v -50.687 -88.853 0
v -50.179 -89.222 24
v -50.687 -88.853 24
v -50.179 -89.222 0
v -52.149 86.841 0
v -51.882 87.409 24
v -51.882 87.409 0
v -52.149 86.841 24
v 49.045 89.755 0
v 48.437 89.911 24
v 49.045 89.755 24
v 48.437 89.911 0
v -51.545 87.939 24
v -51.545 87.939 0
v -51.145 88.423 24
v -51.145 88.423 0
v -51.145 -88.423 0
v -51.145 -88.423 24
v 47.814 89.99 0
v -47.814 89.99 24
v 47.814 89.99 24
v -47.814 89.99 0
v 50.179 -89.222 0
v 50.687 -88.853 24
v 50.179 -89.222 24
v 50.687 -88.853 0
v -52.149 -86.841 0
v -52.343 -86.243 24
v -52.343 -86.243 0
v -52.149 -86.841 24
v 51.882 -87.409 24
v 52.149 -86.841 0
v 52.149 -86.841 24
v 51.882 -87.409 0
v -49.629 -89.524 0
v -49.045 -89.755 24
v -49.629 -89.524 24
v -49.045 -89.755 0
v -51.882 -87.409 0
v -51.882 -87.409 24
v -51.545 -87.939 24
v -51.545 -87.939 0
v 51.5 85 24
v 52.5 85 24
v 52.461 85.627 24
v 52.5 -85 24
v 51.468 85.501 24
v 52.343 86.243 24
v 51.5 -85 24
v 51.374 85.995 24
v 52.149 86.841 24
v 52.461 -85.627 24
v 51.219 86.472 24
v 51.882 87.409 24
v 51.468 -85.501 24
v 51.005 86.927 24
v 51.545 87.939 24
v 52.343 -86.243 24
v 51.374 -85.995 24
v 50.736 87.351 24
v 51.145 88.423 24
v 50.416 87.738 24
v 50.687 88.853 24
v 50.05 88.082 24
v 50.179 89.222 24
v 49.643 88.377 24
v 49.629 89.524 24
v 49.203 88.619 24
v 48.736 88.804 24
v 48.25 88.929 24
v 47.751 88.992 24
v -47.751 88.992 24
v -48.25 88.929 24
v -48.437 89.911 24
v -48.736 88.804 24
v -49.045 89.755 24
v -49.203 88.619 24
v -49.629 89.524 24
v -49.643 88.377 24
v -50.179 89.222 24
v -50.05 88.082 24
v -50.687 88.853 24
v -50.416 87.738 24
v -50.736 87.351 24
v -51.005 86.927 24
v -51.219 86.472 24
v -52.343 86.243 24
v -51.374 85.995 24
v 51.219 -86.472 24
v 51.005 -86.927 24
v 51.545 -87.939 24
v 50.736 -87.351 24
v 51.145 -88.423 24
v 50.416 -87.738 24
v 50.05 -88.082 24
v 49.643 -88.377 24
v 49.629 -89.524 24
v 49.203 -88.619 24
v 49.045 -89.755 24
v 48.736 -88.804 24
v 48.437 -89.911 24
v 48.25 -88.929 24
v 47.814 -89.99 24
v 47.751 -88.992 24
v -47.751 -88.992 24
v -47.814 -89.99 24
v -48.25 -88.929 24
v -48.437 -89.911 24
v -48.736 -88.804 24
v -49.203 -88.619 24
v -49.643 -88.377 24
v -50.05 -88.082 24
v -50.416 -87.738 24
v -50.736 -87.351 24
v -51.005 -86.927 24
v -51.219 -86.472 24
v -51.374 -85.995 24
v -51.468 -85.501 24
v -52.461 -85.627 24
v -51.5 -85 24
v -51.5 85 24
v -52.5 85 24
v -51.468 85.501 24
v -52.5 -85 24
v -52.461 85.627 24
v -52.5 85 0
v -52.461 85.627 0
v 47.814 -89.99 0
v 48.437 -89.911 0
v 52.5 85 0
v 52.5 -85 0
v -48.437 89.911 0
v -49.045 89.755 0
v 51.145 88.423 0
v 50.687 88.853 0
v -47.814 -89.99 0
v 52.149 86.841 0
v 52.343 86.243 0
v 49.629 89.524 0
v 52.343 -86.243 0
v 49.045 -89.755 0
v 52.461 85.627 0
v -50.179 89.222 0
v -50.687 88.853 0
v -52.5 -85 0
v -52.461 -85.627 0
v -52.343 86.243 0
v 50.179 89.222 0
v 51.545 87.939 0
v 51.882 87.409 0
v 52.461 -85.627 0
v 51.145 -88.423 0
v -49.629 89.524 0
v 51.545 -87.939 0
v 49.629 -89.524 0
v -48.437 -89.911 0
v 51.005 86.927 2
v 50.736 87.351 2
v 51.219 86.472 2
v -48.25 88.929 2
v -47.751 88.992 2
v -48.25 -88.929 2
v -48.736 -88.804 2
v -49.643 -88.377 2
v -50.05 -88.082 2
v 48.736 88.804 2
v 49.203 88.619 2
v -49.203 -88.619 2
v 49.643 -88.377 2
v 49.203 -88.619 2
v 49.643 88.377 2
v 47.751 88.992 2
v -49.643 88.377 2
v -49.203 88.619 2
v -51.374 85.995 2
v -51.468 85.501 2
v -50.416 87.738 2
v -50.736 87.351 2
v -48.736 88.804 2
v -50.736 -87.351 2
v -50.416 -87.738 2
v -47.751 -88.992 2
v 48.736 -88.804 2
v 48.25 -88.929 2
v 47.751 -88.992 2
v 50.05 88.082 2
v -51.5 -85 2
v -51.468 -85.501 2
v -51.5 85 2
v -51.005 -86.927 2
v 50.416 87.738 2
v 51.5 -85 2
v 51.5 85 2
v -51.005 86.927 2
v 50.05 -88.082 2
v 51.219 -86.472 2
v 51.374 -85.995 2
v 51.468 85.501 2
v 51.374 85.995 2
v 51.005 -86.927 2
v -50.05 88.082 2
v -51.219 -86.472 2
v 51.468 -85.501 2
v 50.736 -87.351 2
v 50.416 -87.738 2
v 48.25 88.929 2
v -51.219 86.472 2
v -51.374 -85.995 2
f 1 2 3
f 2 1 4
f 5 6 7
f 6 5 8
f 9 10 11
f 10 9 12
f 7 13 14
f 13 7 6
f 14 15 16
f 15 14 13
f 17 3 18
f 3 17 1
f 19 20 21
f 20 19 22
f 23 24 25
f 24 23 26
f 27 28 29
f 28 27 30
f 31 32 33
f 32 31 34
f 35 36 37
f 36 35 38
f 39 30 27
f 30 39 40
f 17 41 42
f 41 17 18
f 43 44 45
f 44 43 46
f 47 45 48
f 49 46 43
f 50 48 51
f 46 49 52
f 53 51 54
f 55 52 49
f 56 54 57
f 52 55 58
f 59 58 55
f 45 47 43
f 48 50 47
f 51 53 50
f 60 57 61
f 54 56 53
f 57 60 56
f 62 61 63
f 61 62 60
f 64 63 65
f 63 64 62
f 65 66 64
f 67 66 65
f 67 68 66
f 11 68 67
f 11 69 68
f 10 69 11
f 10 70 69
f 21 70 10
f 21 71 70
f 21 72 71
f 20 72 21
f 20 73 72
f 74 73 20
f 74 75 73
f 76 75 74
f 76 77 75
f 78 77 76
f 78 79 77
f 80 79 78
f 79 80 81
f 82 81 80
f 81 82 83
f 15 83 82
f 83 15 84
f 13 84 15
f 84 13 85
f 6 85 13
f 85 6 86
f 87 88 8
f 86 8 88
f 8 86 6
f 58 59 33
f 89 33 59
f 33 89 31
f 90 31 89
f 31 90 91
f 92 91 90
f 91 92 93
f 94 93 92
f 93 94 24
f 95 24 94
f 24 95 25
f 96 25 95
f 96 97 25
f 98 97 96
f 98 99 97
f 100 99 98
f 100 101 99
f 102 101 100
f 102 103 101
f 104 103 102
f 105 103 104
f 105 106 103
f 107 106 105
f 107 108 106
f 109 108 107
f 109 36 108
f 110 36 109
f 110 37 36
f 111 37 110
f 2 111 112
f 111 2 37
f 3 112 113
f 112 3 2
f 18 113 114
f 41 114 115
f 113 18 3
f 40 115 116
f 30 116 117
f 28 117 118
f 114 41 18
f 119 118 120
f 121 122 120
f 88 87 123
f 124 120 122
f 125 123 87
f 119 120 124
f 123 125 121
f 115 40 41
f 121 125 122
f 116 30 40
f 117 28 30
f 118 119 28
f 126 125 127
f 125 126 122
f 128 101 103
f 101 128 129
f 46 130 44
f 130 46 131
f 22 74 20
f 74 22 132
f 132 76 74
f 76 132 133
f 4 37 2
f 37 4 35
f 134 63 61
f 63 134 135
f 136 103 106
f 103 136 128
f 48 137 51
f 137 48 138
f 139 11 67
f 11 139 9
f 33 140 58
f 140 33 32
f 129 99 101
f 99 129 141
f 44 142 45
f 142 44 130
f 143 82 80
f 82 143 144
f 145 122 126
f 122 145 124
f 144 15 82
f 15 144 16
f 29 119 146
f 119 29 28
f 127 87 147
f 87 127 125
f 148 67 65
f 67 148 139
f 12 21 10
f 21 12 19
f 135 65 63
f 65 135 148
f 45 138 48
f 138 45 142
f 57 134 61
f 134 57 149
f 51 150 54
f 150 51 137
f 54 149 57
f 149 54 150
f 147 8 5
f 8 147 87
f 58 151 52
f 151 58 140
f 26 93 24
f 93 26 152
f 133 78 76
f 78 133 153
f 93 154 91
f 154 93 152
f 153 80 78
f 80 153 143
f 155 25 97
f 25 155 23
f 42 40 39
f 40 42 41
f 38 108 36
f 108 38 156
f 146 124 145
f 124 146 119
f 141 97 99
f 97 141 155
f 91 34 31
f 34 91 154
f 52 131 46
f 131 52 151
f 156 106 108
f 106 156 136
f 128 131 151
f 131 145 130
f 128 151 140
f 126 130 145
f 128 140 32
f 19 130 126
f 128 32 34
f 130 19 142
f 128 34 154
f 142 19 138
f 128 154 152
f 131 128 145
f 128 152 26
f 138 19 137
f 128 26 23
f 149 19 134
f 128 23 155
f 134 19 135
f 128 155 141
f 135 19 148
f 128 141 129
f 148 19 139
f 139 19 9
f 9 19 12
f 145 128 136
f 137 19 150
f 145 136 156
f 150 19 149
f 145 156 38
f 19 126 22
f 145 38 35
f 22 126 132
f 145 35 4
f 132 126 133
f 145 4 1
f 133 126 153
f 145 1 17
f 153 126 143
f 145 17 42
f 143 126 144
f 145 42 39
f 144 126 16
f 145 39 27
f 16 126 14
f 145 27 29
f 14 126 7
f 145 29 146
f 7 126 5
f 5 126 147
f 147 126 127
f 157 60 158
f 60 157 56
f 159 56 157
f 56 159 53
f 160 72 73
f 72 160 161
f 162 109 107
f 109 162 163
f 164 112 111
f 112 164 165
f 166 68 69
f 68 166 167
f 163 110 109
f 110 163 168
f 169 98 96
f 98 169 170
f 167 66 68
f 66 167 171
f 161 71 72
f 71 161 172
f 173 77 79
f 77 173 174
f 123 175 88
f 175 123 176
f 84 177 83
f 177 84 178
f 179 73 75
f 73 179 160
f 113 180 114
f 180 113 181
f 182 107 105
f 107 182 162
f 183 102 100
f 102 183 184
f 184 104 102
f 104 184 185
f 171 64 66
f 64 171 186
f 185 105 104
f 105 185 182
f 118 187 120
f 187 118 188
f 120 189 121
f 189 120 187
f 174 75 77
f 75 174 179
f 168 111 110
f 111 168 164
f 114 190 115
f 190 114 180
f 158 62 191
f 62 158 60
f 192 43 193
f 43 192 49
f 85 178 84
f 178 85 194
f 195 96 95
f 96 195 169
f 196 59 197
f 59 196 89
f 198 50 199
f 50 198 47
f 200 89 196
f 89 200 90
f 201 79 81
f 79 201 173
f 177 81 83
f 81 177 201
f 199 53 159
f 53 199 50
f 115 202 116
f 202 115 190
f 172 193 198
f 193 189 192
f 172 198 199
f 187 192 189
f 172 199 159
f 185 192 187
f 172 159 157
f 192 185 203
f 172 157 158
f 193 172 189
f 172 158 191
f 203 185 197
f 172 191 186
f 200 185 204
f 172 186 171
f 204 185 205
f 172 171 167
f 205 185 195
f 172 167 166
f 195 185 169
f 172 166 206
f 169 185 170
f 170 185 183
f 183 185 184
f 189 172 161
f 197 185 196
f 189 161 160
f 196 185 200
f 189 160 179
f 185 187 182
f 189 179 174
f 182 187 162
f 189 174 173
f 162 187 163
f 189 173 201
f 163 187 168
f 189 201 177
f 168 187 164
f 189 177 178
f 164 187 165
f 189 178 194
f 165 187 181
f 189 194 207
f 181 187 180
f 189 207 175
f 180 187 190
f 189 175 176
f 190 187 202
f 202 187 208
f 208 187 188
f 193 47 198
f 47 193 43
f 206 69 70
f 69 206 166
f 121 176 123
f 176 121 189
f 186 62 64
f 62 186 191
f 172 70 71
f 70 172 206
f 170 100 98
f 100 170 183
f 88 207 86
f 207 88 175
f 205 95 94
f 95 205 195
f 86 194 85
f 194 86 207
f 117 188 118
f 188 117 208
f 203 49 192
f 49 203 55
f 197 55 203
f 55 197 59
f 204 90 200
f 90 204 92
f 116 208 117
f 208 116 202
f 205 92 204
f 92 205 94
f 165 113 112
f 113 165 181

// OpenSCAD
$fn = 50;


difference() {
	union() {
		hull() {
			translate(v = [-47.5000000000, 85.0000000000, 0]) {
				cylinder(h = 24, r = 5);
			}
			translate(v = [47.5000000000, 85.0000000000, 0]) {
				cylinder(h = 24, r = 5);
			}
			translate(v = [-47.5000000000, -85.0000000000, 0]) {
				cylinder(h = 24, r = 5);
			}
			translate(v = [47.5000000000, -85.0000000000, 0]) {
				cylinder(h = 24, r = 5);
			}
		}
	}
	union() {
		translate(v = [0, 0, 2]) {
			hull() {
				translate(v = [-47.5000000000, 85.0000000000, 0]) {
					cylinder(h = 22, r = 4);
				}
				translate(v = [47.5000000000, 85.0000000000, 0]) {
					cylinder(h = 22, r = 4);
				}
				translate(v = [-47.5000000000, -85.0000000000, 0]) {
					cylinder(h = 22, r = 4);
				}
				translate(v = [47.5000000000, -85.0000000000, 0]) {
					cylinder(h = 22, r = 4);
				}
			}
		}
	}
}
